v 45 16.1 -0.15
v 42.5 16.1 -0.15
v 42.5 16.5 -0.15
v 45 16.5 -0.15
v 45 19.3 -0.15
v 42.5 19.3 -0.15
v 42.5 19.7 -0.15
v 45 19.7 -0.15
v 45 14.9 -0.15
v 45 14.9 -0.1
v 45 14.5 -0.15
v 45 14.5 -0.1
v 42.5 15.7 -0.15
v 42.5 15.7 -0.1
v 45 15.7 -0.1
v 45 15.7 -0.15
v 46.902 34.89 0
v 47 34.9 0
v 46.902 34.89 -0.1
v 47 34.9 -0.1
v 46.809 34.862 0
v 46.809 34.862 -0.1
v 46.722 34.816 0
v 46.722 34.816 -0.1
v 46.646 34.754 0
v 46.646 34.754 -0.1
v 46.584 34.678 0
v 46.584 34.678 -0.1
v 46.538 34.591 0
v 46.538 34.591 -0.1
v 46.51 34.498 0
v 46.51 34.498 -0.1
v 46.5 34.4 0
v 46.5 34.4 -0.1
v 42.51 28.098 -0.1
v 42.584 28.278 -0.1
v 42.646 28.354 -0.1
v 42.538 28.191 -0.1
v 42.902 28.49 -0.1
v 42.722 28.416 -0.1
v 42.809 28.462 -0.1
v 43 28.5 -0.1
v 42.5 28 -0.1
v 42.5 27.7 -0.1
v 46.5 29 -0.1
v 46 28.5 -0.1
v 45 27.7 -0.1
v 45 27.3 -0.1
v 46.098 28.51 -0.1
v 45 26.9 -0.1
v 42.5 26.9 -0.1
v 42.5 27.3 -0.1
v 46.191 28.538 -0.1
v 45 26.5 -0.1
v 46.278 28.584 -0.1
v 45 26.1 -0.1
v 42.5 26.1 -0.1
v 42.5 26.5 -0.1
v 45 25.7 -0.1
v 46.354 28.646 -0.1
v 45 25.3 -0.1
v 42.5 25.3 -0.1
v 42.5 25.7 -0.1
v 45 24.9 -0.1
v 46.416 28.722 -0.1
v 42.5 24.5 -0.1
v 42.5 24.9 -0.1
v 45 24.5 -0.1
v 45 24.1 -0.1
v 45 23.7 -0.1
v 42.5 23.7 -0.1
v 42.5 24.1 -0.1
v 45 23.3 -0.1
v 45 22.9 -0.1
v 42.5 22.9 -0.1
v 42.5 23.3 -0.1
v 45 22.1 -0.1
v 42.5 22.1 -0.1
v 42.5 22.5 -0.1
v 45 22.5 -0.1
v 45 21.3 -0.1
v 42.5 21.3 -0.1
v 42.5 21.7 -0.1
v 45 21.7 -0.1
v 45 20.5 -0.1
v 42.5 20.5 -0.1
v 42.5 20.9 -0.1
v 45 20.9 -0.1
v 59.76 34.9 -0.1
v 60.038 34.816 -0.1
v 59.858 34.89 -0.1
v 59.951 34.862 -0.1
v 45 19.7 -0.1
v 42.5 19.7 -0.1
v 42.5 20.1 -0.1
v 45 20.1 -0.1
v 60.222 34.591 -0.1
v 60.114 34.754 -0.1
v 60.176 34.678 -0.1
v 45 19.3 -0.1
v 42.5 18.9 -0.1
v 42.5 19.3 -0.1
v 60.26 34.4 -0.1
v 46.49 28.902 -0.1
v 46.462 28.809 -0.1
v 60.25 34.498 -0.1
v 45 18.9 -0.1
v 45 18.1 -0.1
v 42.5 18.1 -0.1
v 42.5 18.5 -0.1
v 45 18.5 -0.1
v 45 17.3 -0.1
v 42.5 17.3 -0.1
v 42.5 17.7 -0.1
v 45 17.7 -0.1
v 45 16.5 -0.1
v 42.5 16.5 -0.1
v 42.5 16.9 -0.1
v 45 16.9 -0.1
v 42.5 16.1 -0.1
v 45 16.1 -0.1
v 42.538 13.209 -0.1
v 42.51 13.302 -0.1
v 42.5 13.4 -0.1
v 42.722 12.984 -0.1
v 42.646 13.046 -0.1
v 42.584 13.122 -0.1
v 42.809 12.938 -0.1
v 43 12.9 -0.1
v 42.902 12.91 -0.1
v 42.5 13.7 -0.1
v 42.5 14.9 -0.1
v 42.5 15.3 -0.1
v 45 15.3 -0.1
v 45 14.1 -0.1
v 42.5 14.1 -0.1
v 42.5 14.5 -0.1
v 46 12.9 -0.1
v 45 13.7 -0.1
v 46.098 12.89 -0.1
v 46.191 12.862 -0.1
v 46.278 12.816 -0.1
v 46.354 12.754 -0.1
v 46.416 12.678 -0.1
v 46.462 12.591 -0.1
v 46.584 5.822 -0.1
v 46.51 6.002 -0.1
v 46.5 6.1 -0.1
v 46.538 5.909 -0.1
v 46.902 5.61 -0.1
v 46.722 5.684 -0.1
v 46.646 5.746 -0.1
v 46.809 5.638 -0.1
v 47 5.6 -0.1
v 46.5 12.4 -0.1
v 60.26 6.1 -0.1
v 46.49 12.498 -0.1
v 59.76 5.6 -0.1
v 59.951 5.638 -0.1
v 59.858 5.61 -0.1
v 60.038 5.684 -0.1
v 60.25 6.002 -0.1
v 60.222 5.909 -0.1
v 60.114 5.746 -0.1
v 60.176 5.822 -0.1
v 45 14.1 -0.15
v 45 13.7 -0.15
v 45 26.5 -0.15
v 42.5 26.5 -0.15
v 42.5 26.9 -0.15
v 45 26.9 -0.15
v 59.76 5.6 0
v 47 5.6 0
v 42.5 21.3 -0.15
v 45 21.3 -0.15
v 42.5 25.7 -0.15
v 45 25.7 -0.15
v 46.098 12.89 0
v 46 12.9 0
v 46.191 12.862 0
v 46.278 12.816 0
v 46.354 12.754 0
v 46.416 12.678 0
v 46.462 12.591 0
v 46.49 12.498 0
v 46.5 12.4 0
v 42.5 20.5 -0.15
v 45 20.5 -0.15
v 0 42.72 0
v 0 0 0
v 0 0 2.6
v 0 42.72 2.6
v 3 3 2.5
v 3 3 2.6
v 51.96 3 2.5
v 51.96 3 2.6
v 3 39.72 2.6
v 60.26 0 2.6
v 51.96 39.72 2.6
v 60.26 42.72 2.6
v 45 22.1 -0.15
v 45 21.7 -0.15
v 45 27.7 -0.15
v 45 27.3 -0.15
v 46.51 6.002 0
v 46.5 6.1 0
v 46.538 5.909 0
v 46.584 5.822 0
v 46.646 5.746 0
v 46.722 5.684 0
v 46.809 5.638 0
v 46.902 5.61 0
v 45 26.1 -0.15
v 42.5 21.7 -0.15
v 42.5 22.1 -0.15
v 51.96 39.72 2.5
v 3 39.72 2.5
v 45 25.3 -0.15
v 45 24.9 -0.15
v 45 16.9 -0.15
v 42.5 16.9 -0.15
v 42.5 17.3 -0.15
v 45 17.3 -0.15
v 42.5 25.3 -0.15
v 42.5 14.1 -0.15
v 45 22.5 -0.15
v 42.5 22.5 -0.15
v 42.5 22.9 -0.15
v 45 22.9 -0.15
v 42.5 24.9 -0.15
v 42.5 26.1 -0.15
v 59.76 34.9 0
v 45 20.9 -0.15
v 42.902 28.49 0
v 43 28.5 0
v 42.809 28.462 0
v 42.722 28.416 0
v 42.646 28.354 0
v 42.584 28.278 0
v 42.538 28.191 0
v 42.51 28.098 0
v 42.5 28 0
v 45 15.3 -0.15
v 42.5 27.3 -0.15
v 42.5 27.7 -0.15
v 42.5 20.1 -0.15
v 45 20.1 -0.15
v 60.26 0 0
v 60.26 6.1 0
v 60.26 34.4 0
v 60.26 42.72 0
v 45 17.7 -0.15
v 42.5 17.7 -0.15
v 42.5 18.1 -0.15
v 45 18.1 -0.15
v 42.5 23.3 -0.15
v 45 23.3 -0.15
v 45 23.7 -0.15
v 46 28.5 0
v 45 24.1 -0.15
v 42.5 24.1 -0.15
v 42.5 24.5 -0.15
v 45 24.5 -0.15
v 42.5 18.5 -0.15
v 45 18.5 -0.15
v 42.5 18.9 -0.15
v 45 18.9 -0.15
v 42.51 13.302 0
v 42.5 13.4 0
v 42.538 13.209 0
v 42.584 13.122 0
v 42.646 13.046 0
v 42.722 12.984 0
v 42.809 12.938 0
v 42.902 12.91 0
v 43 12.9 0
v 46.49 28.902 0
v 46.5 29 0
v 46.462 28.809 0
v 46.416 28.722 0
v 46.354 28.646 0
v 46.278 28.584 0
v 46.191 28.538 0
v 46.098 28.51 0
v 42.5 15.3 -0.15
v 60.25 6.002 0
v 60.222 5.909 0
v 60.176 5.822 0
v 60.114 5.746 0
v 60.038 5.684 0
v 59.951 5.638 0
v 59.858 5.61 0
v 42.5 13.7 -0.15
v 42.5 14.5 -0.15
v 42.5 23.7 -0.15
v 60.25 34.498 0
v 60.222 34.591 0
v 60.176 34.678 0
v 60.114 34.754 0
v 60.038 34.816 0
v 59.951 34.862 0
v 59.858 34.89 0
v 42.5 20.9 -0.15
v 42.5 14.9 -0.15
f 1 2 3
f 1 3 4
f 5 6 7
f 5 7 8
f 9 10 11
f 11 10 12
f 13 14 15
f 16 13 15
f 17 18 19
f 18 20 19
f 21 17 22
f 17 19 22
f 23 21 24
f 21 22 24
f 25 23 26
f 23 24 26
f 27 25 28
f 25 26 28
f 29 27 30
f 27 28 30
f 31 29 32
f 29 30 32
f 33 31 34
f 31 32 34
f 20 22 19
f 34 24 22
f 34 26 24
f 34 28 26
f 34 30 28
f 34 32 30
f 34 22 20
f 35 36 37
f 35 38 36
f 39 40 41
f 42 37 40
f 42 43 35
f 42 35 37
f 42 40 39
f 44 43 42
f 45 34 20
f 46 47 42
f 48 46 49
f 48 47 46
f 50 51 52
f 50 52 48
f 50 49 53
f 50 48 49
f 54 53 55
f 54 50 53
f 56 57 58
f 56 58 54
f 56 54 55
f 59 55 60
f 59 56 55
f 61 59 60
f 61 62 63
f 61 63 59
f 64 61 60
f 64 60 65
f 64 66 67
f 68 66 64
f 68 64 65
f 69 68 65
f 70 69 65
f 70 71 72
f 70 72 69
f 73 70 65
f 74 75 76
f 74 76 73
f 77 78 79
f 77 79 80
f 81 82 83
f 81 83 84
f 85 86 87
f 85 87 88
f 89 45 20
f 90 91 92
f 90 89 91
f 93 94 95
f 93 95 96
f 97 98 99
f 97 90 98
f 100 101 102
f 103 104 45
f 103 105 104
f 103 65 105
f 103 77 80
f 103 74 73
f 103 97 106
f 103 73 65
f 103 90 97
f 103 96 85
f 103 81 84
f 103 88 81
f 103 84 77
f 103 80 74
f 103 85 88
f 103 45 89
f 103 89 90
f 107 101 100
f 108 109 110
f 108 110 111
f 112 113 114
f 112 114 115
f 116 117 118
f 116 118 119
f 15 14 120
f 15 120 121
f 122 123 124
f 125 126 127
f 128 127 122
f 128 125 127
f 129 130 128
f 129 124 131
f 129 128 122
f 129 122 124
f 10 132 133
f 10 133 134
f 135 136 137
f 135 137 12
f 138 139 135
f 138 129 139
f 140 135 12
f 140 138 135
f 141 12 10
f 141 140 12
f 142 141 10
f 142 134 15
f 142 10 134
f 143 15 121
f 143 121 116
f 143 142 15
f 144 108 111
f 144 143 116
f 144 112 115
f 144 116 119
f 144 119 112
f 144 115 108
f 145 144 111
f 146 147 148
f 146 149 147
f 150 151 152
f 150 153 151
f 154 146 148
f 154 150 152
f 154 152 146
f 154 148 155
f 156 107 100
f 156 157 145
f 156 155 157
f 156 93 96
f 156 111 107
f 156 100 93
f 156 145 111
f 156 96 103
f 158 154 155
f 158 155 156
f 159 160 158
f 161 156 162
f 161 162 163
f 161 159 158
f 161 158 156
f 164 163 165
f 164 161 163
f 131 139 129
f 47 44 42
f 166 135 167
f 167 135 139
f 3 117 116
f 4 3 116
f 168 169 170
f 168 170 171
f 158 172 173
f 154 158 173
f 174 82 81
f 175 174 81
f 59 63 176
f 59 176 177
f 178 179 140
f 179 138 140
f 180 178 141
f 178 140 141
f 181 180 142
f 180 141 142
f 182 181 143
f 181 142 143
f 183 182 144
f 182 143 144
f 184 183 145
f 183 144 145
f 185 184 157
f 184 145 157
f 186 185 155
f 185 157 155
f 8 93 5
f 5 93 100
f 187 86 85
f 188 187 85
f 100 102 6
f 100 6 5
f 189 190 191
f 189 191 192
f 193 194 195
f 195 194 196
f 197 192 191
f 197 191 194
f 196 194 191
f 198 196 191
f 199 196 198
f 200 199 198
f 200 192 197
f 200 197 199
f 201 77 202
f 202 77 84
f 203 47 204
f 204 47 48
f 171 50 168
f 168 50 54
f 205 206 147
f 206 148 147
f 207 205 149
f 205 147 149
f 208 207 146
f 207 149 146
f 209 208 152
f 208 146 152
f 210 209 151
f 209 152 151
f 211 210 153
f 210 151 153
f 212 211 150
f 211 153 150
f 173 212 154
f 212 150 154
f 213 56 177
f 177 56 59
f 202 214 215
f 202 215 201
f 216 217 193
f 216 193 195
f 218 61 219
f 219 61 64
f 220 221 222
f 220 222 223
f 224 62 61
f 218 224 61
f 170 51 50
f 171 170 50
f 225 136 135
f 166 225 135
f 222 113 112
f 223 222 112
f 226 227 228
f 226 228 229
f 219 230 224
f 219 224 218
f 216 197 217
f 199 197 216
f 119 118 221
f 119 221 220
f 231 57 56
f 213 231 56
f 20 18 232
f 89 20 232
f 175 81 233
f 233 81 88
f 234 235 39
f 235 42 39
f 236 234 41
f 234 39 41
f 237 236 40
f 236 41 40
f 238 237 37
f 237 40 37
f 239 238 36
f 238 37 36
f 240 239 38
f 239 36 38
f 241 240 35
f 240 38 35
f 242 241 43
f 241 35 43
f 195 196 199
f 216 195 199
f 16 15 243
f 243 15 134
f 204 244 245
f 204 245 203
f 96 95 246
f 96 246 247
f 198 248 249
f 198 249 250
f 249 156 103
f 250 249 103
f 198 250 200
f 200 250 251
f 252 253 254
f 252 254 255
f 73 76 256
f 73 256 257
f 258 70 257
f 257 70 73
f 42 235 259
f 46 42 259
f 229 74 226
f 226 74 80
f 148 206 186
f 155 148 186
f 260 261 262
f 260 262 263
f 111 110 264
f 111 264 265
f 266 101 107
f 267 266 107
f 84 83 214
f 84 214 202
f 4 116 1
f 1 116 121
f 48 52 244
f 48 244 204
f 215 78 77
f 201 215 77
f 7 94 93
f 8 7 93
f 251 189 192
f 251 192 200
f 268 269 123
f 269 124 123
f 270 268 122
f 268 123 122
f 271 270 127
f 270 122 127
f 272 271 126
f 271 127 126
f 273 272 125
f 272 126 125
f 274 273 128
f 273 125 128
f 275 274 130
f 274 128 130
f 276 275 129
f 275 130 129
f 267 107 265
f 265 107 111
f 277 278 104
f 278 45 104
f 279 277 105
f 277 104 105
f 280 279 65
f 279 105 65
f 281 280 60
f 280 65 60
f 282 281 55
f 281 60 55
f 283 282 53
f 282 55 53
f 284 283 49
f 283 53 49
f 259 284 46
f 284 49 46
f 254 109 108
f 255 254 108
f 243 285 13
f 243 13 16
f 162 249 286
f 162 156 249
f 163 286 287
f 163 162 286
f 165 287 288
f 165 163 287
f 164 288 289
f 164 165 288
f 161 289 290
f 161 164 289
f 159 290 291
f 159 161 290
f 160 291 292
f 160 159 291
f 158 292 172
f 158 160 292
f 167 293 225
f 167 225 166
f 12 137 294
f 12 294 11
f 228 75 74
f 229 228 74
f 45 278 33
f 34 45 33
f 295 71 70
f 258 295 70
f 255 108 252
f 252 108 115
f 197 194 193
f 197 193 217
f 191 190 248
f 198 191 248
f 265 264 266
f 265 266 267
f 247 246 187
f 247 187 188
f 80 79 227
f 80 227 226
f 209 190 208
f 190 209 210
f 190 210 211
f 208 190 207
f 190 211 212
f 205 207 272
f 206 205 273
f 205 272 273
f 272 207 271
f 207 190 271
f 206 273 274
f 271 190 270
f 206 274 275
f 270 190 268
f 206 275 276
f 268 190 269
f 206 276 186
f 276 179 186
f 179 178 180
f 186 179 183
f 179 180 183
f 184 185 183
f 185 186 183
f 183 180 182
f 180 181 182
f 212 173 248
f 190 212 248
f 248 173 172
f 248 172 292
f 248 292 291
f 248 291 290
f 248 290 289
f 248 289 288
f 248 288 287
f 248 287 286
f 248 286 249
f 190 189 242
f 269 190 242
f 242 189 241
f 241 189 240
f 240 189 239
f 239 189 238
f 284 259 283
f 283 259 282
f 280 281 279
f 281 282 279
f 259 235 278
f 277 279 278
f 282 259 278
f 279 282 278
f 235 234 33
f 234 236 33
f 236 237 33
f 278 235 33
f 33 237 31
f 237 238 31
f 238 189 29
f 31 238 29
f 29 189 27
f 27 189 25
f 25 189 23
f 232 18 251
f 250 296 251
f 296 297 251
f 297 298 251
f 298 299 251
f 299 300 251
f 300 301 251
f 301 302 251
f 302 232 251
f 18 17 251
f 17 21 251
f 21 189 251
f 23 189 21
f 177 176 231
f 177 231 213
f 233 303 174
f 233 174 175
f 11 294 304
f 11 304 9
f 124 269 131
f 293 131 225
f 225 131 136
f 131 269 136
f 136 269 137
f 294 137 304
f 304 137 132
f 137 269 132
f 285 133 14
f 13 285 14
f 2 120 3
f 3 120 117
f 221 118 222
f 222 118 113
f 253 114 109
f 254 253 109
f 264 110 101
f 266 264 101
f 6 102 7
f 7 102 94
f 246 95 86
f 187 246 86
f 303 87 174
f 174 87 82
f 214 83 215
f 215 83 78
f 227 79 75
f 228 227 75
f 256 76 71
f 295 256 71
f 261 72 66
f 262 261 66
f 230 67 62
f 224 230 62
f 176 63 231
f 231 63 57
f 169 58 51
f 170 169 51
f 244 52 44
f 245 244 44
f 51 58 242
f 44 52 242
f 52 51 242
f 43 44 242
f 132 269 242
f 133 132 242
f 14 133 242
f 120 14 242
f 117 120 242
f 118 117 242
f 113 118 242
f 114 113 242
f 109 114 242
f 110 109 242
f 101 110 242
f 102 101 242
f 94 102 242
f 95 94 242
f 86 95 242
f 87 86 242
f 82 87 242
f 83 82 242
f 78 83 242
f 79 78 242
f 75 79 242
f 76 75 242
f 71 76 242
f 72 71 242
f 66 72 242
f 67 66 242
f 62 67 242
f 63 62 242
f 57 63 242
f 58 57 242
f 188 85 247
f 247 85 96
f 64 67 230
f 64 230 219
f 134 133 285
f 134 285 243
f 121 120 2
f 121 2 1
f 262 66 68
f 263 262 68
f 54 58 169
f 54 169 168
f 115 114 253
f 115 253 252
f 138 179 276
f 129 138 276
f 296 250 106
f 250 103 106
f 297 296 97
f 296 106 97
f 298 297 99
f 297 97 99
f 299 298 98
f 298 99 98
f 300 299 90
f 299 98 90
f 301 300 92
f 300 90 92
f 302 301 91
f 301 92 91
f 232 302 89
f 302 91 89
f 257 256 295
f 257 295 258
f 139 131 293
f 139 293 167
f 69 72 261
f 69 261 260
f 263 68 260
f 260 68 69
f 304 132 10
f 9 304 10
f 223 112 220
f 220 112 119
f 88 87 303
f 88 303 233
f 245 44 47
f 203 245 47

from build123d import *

# Parameters (mm, degrees)
SKETCH_W            = 60.26
SKETCH_H            = 42.72
PAD_DEPTH           = 2.6
SKETCH001_W         = 48.96
SKETCH001_H         = 36.72
POCKET_DEPTH        = 0.1
PAD001_DEPTH        = 0.1
FILLET_R            = 0.5
SKETCH003_W         = 2.5
SKETCH003_H         = 0.4
PAD002_DEPTH        = 0.05
LINEARPATTERN_COUNT = 18
LINEARPATTERN_PITCH = 0.8


with BuildPart() as part:
    # Sketch → Pad (new body)
    with BuildSketch(Plane.XY):
        with Locations((30.13, 21.36)):
            Rectangle(SKETCH_W, SKETCH_H)
    extrude(amount=PAD_DEPTH)

    # Sketch001 (on Face6 of Pad) → Pocket (cut)
    with BuildSketch(Plane.XY.offset(2.6)):
        with Locations((27.48, 21.36)):
            Rectangle(SKETCH001_W, SKETCH001_H)
    extrude(amount=-POCKET_DEPTH, mode=Mode.SUBTRACT)

    # Sketch002 (on Face4 of Pocket) → Pad001 (join)
    with BuildSketch(Plane(origin=(0, 0, 0), x_dir=(1, 0, 0), z_dir=(0, 0, -1))):
        Polygon((60.26, -5.6), (46.5, -5.6), (46.5, -12.9), (42.5, -12.9), (42.5, -28.5), (46.5, -28.5), (46.5, -34.9), (60.26, -34.9), align=None)
    extrude(amount=PAD001_DEPTH)

    # Fillet
    fillet_edges = [part.edges().sort_by_distance(p)[0] for p in [
        (46.5, 5.6, -0.05),
        (46.5, 12.9, -0.05),
        (42.5, 12.9, -0.05),
        (42.5, 28.5, -0.05),
        (46.5, 28.5, -0.05),
        (46.5, 34.9, -0.05),
        (60.26, 34.9, -0.05),
        (60.26, 5.6, -0.05),
    ]]
    fillet(fillet_edges, radius=FILLET_R)

    # Sketch003 (on Face22 of Fillet) → Pad002 (join)
    with BuildSketch(Plane(origin=(0, 0, -0.1), x_dir=(1, 0, 0), z_dir=(0, 0, -1))):
        with Locations((43.75, -13.9)):
            Rectangle(SKETCH003_W, SKETCH003_H)
    pad002 = extrude(amount=PAD002_DEPTH)

    # LinearPattern: Pad002 ×18
    with Locations(*[(0, i * LINEARPATTERN_PITCH, 0) for i in range(1, LINEARPATTERN_COUNT)]):
        add(pad002)


solid = part.part
